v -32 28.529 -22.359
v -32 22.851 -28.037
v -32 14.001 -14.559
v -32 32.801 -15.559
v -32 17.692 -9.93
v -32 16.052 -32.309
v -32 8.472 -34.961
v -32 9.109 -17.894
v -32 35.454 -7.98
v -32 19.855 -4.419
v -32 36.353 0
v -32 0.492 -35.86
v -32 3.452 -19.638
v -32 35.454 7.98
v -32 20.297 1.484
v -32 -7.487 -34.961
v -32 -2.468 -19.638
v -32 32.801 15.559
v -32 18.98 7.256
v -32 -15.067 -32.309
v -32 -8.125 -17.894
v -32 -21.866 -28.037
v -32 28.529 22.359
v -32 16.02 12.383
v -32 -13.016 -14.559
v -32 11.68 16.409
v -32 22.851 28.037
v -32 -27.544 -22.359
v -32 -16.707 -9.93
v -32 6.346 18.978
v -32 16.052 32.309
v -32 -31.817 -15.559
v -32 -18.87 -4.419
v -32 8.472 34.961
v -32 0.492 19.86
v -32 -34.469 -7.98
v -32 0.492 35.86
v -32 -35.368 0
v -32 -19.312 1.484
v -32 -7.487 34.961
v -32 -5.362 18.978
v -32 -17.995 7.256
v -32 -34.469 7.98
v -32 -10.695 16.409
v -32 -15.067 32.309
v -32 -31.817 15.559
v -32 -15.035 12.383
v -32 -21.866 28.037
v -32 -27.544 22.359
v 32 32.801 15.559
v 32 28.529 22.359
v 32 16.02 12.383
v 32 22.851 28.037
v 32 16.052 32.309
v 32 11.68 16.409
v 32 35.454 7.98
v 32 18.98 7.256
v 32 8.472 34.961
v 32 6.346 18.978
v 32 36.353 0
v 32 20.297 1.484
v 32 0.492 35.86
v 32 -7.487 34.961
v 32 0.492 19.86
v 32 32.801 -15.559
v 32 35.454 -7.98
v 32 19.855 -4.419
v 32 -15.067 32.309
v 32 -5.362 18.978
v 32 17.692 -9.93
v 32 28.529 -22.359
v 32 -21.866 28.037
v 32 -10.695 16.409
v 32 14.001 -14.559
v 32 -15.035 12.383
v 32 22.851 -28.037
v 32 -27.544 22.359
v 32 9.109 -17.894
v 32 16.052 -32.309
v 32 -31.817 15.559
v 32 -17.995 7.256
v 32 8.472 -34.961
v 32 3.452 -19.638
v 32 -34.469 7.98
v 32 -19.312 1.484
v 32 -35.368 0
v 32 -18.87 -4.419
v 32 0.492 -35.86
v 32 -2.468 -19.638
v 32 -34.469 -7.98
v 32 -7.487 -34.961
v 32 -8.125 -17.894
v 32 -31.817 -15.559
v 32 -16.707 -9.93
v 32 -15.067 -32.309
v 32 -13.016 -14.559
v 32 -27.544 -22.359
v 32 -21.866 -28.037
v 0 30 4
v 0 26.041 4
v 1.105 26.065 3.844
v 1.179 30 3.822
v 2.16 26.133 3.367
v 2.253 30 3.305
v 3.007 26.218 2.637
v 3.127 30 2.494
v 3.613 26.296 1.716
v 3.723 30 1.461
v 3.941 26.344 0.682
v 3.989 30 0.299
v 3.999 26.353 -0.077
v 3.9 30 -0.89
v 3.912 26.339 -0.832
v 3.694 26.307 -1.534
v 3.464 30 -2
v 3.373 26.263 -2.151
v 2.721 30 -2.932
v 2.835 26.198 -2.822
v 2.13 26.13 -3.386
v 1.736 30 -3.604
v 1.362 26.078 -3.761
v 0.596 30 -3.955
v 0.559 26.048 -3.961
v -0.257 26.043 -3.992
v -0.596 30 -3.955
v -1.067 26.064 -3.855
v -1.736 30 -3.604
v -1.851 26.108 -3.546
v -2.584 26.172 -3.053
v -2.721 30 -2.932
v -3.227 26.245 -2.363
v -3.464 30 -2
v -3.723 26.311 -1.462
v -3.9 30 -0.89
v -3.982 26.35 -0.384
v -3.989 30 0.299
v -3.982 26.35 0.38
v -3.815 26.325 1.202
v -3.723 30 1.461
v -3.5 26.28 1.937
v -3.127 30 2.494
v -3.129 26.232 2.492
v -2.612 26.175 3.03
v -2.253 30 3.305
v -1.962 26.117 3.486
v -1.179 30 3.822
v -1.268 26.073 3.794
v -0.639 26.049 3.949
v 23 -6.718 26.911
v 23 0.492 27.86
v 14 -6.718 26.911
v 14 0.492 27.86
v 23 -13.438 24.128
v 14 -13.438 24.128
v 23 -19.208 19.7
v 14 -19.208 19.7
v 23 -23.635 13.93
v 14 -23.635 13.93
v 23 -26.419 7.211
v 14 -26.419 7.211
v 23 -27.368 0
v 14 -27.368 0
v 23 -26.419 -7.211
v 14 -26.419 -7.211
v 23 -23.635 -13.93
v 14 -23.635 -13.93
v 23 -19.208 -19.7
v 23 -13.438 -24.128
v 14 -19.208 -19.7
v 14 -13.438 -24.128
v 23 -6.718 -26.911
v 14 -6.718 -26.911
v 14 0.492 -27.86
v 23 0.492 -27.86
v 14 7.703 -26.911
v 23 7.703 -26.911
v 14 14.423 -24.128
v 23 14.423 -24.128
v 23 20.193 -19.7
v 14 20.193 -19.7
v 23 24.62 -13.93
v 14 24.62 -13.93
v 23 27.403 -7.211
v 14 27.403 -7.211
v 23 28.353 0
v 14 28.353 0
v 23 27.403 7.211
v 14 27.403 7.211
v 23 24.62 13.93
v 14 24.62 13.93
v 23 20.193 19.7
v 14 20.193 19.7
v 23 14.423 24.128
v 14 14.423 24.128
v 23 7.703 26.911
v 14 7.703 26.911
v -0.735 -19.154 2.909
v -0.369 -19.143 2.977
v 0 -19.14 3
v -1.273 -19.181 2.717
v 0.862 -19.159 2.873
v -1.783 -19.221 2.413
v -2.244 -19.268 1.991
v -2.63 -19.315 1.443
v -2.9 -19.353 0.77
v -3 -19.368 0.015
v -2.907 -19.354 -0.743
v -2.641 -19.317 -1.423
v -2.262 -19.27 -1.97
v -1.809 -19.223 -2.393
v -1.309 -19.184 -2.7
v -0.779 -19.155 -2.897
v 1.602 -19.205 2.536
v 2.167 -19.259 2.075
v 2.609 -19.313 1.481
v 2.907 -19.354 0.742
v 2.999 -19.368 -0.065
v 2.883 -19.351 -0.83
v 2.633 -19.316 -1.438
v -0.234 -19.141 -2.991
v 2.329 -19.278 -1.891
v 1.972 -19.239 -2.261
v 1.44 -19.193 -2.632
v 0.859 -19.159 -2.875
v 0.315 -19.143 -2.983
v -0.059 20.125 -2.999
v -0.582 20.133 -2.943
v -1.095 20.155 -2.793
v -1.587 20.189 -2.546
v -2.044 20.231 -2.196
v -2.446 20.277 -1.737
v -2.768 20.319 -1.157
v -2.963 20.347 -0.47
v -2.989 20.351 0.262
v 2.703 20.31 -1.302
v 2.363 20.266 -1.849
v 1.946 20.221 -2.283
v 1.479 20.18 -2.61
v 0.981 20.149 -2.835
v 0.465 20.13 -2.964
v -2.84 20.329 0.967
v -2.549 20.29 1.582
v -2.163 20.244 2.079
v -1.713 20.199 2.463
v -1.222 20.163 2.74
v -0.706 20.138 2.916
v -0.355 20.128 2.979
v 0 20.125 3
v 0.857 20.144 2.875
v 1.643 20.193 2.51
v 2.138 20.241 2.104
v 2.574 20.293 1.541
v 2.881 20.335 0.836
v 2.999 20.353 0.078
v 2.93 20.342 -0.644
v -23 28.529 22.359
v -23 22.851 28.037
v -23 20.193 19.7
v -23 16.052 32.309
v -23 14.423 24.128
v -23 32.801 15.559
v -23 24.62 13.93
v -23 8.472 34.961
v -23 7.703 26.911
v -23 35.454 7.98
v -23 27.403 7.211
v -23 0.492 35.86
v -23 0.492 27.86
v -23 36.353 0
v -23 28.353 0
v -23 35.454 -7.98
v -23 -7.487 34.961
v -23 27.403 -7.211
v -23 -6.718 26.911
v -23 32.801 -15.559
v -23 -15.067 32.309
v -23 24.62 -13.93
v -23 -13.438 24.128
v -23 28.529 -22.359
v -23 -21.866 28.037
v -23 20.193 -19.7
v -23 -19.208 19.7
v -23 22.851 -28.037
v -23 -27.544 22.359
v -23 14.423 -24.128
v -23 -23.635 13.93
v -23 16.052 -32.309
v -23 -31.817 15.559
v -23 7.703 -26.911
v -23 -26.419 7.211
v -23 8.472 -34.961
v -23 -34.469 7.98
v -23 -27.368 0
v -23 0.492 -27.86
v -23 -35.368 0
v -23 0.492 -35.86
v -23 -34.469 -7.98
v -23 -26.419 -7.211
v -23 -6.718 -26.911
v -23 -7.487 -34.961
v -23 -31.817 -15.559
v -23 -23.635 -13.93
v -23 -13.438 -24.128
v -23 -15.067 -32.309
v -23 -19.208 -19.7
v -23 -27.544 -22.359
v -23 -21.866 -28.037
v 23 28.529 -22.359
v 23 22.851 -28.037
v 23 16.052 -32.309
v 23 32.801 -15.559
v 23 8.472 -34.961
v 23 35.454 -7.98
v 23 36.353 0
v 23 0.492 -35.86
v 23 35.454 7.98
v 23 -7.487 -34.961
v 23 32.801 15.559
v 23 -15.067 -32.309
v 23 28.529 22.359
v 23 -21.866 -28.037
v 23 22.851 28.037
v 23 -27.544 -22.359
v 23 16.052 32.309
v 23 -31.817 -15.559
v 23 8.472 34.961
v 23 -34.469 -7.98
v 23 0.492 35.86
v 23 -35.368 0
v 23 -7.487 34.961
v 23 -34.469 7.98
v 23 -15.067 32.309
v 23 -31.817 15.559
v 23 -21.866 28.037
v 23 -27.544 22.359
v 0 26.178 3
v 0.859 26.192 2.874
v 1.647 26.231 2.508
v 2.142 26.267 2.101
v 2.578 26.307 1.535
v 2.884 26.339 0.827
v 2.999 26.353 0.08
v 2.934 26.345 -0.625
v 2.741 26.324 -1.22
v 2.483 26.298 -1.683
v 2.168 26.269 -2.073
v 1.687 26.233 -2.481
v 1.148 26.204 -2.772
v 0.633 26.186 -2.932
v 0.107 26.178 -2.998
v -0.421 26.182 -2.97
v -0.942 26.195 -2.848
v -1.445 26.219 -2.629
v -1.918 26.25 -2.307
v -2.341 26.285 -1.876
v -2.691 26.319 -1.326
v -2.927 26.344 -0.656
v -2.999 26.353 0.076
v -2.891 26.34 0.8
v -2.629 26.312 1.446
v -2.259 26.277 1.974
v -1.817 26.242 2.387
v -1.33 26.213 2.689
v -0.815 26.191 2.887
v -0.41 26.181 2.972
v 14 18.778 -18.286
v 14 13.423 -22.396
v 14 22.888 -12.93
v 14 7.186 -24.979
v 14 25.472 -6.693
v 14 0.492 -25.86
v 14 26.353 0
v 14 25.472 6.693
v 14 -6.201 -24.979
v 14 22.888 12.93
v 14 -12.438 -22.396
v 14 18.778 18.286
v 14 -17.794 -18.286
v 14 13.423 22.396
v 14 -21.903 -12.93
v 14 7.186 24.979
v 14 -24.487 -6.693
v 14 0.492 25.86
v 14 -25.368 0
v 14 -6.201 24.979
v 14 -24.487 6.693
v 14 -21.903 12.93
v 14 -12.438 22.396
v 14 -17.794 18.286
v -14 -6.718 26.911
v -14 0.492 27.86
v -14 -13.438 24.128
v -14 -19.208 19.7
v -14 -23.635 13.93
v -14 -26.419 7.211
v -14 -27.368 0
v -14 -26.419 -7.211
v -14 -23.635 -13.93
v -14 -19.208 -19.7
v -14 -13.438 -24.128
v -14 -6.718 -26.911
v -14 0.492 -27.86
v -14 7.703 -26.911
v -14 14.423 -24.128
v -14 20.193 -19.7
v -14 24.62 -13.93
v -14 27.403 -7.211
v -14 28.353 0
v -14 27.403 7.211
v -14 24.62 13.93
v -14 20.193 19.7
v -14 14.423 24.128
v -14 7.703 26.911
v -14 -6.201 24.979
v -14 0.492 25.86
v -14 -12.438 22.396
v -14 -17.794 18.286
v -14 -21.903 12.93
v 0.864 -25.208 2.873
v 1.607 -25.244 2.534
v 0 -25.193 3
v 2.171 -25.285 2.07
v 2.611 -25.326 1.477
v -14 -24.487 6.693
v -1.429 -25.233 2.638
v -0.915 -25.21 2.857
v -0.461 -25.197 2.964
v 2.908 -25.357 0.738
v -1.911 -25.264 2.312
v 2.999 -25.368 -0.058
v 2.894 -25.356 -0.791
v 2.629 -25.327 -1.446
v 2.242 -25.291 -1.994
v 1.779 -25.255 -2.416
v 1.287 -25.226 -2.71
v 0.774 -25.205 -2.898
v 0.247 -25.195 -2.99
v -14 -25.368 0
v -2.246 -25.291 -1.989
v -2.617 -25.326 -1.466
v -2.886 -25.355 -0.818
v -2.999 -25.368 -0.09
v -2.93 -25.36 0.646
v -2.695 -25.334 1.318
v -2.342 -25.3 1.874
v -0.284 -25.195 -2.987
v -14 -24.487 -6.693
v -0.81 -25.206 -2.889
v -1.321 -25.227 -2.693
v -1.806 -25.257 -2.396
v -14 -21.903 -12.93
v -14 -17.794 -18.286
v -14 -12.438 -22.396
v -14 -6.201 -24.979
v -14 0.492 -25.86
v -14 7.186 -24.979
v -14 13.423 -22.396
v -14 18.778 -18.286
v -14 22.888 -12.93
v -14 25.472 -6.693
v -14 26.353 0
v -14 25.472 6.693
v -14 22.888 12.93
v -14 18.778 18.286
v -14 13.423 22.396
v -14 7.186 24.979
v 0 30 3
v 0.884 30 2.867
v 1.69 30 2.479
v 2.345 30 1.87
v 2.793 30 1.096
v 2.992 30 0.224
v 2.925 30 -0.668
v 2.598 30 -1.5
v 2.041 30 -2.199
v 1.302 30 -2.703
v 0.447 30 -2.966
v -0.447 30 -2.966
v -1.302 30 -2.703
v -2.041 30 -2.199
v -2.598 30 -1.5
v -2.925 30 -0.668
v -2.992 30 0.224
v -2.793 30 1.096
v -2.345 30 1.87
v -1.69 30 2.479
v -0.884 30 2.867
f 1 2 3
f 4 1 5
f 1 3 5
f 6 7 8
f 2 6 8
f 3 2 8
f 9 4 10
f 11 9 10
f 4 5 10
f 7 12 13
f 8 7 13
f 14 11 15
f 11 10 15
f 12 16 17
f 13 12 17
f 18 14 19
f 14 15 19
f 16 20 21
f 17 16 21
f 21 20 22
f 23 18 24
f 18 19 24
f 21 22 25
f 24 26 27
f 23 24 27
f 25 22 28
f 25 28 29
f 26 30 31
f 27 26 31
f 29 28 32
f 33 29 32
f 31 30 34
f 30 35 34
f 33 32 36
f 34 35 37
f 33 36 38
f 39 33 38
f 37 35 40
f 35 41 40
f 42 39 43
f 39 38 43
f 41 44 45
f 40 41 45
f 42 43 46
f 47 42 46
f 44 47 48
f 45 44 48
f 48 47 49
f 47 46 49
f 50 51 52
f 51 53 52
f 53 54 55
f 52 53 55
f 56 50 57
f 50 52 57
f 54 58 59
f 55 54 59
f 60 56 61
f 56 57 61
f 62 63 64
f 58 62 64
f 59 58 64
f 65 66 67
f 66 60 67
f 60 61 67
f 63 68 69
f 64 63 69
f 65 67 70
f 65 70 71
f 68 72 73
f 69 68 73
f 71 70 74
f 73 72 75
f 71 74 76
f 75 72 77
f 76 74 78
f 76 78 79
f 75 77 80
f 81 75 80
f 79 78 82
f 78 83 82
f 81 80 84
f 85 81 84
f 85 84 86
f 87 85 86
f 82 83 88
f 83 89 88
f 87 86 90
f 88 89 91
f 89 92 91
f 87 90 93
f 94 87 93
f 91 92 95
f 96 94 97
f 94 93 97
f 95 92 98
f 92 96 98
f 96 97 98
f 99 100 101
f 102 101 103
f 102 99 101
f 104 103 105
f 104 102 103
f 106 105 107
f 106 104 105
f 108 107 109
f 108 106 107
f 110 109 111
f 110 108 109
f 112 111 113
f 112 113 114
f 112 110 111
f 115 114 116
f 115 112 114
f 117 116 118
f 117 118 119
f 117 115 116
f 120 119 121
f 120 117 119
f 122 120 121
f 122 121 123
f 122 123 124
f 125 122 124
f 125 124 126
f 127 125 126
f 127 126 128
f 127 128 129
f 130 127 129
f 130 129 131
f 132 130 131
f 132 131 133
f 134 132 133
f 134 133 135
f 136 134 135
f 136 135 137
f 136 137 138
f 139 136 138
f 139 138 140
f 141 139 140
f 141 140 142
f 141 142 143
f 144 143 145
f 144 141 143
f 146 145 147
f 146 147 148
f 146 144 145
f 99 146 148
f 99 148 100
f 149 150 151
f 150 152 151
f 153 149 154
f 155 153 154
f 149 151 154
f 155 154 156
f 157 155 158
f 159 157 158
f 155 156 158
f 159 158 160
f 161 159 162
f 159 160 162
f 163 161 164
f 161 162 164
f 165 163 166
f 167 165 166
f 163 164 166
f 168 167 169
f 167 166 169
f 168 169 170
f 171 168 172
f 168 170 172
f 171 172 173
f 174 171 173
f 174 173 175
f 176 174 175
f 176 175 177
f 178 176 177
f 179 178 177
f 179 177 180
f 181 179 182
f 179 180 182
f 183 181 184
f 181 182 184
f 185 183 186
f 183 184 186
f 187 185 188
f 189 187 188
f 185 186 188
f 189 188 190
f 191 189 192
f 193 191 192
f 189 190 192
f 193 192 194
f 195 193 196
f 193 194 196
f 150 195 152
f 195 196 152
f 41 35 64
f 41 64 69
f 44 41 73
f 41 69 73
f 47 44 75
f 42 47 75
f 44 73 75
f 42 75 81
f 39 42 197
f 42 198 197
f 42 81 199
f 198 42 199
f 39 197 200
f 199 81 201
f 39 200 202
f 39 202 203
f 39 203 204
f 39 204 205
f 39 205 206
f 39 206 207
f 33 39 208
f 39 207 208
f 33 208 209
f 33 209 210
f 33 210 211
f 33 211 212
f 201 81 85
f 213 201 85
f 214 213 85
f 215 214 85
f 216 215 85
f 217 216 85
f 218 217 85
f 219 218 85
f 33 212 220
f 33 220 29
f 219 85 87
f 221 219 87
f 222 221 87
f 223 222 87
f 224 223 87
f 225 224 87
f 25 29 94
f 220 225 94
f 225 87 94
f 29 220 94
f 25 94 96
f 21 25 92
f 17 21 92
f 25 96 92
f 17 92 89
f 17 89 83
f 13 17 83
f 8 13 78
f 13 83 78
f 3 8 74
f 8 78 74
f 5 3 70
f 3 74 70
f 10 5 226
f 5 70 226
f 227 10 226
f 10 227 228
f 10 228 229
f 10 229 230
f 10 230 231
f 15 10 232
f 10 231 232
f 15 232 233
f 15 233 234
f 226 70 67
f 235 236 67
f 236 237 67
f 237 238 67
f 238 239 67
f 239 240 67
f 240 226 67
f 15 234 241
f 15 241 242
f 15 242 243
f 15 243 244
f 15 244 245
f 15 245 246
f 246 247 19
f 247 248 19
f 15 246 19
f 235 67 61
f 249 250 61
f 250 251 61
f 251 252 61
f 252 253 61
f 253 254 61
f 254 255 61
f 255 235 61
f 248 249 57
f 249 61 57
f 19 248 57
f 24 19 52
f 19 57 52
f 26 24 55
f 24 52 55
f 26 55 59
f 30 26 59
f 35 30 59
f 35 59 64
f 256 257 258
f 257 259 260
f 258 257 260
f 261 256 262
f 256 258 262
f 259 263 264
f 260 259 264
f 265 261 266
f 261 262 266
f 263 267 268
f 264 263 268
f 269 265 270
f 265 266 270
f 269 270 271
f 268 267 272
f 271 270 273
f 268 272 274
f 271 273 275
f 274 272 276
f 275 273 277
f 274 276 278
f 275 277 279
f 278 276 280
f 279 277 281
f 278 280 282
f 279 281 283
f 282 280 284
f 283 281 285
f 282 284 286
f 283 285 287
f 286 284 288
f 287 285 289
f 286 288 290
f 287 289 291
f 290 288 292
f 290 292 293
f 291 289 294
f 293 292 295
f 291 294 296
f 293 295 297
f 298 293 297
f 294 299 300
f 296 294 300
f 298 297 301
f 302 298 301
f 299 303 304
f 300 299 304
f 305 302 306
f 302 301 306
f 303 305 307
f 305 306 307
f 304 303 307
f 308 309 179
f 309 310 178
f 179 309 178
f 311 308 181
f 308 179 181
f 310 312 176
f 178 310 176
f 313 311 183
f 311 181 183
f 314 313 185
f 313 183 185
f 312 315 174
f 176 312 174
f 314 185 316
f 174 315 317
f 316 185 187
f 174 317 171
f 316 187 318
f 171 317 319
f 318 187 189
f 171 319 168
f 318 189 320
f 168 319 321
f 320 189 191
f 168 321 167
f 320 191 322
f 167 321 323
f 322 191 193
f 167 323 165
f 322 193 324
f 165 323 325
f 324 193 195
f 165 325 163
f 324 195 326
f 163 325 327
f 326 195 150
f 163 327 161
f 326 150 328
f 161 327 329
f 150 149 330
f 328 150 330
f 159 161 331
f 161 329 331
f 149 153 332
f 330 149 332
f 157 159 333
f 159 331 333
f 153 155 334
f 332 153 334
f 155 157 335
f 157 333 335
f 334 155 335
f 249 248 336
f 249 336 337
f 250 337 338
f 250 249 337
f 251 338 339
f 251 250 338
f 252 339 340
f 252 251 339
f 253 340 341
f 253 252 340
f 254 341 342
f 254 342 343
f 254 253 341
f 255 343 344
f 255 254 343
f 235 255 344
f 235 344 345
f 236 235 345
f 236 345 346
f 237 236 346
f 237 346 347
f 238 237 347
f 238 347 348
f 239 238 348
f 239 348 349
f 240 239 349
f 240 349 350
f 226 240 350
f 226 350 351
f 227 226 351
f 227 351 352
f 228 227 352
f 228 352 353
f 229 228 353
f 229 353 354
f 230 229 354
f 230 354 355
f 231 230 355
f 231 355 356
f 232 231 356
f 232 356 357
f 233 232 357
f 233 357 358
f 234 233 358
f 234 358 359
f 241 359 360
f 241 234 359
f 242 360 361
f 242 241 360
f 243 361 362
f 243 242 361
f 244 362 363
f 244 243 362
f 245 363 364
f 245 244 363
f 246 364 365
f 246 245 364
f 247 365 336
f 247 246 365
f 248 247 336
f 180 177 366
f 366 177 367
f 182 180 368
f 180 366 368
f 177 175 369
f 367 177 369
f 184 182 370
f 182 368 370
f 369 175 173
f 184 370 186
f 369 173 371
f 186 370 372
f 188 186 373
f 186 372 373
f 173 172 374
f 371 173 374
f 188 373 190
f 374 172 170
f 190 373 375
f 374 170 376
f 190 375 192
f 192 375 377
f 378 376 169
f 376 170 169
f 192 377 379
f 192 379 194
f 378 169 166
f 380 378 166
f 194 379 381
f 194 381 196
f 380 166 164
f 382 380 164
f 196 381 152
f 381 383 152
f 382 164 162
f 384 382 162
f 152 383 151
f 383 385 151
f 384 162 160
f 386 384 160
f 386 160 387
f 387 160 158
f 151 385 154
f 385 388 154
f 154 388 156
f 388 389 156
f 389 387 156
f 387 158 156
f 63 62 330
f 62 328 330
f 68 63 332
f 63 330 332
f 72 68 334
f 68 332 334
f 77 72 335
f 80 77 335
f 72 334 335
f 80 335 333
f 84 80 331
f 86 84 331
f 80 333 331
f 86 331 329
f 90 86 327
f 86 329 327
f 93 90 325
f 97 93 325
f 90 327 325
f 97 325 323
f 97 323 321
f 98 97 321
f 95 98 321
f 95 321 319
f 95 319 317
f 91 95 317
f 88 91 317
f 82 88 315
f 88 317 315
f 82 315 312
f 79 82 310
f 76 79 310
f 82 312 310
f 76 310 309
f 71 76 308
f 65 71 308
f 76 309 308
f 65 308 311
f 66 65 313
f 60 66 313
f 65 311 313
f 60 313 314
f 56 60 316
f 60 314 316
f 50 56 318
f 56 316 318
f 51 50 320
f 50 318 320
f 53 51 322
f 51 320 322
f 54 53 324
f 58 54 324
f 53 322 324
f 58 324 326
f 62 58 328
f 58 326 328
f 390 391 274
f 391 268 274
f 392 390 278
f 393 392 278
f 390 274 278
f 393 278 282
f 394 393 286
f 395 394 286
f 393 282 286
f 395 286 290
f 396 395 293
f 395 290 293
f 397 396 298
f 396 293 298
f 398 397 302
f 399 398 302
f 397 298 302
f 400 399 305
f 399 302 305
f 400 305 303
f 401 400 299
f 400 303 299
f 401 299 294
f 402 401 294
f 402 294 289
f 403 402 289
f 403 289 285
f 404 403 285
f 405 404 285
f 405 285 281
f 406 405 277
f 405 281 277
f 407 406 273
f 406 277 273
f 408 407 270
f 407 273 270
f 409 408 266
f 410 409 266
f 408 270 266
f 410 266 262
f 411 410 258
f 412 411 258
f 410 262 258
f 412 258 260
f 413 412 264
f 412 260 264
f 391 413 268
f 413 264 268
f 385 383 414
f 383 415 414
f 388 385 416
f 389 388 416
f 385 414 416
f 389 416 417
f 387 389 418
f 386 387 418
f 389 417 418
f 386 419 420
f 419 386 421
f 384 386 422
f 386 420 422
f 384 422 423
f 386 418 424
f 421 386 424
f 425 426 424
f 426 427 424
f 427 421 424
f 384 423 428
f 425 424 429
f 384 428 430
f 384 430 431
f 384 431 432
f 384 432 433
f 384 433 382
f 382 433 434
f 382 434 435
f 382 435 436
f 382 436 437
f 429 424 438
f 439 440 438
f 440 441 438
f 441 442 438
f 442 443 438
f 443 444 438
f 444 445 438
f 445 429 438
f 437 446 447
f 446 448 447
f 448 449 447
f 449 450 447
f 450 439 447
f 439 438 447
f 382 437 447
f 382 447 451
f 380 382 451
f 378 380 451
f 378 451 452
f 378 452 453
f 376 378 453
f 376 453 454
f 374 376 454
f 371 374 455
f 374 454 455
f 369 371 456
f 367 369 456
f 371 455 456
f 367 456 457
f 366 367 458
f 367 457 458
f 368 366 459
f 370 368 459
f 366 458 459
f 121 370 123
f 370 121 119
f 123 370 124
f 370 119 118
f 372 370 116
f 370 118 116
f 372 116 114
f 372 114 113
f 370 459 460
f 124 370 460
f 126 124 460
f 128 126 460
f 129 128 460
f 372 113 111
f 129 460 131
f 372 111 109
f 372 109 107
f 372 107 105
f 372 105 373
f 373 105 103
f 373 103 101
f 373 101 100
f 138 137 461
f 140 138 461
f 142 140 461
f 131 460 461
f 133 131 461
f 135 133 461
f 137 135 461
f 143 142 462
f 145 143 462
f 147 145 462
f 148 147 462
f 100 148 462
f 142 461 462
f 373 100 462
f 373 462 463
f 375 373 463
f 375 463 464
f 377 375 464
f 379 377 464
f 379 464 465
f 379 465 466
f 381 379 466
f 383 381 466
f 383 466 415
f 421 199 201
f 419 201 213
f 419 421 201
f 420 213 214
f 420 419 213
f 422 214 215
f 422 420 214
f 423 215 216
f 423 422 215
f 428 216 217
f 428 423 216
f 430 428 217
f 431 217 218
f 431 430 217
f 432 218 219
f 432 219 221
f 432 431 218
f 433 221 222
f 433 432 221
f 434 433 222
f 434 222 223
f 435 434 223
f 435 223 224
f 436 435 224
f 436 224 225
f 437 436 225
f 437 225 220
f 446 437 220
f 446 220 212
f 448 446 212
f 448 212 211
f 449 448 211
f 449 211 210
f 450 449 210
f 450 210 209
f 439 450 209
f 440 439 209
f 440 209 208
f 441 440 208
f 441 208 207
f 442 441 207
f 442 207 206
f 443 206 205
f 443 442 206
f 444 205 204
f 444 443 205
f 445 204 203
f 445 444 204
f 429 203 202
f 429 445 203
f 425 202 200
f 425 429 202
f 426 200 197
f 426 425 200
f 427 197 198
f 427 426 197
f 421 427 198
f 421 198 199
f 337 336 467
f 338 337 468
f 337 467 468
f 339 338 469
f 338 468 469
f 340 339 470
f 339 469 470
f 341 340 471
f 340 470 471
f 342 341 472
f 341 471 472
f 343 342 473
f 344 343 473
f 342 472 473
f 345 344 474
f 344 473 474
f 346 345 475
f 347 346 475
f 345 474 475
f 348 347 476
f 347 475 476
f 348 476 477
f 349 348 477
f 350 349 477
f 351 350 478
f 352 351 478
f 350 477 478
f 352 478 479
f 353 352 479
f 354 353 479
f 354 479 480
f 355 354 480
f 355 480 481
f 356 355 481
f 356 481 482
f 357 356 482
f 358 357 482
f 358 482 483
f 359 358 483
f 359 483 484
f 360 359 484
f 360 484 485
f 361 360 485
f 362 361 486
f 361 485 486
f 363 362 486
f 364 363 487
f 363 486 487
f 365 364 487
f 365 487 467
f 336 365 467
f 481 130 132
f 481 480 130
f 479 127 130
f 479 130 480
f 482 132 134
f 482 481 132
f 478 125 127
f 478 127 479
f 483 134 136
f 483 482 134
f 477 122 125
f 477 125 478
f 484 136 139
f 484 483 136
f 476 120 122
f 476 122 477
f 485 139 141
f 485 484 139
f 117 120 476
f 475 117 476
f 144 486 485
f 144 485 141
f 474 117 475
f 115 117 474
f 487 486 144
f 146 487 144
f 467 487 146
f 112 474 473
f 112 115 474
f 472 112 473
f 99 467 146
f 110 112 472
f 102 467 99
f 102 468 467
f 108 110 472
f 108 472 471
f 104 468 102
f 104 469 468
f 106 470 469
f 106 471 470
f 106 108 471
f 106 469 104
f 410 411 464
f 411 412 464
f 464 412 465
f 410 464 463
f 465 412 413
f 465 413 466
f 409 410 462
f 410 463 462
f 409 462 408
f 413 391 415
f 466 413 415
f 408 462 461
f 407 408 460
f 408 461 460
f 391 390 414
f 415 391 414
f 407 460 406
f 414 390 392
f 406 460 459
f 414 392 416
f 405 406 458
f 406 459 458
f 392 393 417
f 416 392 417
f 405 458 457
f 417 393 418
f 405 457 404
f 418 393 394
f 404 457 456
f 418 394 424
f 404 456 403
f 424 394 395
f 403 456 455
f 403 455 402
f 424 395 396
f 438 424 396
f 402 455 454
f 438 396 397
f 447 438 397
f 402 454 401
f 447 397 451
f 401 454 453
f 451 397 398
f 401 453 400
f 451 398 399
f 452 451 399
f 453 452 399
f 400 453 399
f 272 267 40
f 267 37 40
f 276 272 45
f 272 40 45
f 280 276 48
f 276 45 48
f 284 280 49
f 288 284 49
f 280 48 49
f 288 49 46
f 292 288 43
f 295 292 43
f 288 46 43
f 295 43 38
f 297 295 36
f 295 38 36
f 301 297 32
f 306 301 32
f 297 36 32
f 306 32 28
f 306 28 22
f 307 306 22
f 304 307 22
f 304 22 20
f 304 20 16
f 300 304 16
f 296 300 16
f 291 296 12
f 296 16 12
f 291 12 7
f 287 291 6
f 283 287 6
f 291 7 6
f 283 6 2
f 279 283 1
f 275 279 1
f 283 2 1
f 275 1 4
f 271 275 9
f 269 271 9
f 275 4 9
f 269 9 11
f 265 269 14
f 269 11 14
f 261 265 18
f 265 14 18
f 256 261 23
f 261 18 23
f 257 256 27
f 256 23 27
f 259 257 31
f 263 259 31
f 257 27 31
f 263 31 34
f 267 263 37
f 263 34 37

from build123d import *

# Parameters (mm, degrees)
CUT_EXTRUDE1_DEPTH       = 61.261789517
CUT_EXTRUDE1_DEPTH_BACK  = 61.261789517
SKETCH2_R                = 3
BOSS_EXTRUDE1_REACH      = 83.135
BOSS_EXTRUDE1_END_RADIUS = 25.86032094
SKETCH3_R                = 4
SKETCH3_R_2              = 3


with BuildPart() as part:
    # Sketch1 → Revolve1 (revolve)
    with BuildSketch(Plane.XY, mode=Mode.PRIVATE) as revolve1_sk:
        Polygon((-32, 20.352725591), (32, 20.352725591), (32, 36.352725591), (23, 36.352725591), (23, 28.352725591), (14, 28.352725591), (14, 26.352725591), (-14, 26.352725591), (-14, 28.352725591), (-23, 28.352725591), (-23, 36.352725591), (-32, 36.352725591), align=None)
    revolve(revolve1_sk.sketch.rotate(Axis((-45.635800038, 0.492404651, 0), (1, 0, 0)), 90), axis=Axis((-45.635800038, 0.492404651, 0), (1, 0, 0)))

    # Sketch2 → Cut-Extrude1 (cut, two sides: drawn at the far end of the back side and taken through both)
    with BuildSketch(Plane(origin=(0, 0, 0), x_dir=(1, 0, 0), z_dir=(0, 1, 0)).offset(-CUT_EXTRUDE1_DEPTH_BACK)):
        with Locations(Location((0, 0, 0), (0, 0, 270))):
            Circle(SKETCH2_R)
    extrude(amount=CUT_EXTRUDE1_DEPTH + CUT_EXTRUDE1_DEPTH_BACK, mode=Mode.SUBTRACT)

    # Boss-Extrude1: up to this cylinder (the profile starts outside it)
    boss_extrude1_end = Plane(origin=(0, 0.492404651, 0), z_dir=(-1, 0, 0)) * Cylinder(BOSS_EXTRUDE1_END_RADIUS, 218.99064188, mode=Mode.PRIVATE)
    # Sketch3 → Boss-Extrude1 (add, up to the surface)
    with BuildSketch(Plane(origin=(0, 30, 0), x_dir=(1, 0, 0), z_dir=(0, 1, 0)), mode=Mode.PRIVATE) as boss_extrude1_sk1:
        with Locations(Location((0, 0, 0), (0, 0, 270))):
            Circle(SKETCH3_R)
        with Locations(Location((0, 0, 0), (0, 0, 270))):
            Circle(SKETCH3_R_2, mode=Mode.SUBTRACT)
    boss_extrude1_tool1 = extrude(boss_extrude1_sk1.sketch, amount=-BOSS_EXTRUDE1_REACH, mode=Mode.PRIVATE) - boss_extrude1_end
    add(boss_extrude1_tool1.solids().sort_by_distance((0, 30, -3.886863))[0])


solid = part.part
